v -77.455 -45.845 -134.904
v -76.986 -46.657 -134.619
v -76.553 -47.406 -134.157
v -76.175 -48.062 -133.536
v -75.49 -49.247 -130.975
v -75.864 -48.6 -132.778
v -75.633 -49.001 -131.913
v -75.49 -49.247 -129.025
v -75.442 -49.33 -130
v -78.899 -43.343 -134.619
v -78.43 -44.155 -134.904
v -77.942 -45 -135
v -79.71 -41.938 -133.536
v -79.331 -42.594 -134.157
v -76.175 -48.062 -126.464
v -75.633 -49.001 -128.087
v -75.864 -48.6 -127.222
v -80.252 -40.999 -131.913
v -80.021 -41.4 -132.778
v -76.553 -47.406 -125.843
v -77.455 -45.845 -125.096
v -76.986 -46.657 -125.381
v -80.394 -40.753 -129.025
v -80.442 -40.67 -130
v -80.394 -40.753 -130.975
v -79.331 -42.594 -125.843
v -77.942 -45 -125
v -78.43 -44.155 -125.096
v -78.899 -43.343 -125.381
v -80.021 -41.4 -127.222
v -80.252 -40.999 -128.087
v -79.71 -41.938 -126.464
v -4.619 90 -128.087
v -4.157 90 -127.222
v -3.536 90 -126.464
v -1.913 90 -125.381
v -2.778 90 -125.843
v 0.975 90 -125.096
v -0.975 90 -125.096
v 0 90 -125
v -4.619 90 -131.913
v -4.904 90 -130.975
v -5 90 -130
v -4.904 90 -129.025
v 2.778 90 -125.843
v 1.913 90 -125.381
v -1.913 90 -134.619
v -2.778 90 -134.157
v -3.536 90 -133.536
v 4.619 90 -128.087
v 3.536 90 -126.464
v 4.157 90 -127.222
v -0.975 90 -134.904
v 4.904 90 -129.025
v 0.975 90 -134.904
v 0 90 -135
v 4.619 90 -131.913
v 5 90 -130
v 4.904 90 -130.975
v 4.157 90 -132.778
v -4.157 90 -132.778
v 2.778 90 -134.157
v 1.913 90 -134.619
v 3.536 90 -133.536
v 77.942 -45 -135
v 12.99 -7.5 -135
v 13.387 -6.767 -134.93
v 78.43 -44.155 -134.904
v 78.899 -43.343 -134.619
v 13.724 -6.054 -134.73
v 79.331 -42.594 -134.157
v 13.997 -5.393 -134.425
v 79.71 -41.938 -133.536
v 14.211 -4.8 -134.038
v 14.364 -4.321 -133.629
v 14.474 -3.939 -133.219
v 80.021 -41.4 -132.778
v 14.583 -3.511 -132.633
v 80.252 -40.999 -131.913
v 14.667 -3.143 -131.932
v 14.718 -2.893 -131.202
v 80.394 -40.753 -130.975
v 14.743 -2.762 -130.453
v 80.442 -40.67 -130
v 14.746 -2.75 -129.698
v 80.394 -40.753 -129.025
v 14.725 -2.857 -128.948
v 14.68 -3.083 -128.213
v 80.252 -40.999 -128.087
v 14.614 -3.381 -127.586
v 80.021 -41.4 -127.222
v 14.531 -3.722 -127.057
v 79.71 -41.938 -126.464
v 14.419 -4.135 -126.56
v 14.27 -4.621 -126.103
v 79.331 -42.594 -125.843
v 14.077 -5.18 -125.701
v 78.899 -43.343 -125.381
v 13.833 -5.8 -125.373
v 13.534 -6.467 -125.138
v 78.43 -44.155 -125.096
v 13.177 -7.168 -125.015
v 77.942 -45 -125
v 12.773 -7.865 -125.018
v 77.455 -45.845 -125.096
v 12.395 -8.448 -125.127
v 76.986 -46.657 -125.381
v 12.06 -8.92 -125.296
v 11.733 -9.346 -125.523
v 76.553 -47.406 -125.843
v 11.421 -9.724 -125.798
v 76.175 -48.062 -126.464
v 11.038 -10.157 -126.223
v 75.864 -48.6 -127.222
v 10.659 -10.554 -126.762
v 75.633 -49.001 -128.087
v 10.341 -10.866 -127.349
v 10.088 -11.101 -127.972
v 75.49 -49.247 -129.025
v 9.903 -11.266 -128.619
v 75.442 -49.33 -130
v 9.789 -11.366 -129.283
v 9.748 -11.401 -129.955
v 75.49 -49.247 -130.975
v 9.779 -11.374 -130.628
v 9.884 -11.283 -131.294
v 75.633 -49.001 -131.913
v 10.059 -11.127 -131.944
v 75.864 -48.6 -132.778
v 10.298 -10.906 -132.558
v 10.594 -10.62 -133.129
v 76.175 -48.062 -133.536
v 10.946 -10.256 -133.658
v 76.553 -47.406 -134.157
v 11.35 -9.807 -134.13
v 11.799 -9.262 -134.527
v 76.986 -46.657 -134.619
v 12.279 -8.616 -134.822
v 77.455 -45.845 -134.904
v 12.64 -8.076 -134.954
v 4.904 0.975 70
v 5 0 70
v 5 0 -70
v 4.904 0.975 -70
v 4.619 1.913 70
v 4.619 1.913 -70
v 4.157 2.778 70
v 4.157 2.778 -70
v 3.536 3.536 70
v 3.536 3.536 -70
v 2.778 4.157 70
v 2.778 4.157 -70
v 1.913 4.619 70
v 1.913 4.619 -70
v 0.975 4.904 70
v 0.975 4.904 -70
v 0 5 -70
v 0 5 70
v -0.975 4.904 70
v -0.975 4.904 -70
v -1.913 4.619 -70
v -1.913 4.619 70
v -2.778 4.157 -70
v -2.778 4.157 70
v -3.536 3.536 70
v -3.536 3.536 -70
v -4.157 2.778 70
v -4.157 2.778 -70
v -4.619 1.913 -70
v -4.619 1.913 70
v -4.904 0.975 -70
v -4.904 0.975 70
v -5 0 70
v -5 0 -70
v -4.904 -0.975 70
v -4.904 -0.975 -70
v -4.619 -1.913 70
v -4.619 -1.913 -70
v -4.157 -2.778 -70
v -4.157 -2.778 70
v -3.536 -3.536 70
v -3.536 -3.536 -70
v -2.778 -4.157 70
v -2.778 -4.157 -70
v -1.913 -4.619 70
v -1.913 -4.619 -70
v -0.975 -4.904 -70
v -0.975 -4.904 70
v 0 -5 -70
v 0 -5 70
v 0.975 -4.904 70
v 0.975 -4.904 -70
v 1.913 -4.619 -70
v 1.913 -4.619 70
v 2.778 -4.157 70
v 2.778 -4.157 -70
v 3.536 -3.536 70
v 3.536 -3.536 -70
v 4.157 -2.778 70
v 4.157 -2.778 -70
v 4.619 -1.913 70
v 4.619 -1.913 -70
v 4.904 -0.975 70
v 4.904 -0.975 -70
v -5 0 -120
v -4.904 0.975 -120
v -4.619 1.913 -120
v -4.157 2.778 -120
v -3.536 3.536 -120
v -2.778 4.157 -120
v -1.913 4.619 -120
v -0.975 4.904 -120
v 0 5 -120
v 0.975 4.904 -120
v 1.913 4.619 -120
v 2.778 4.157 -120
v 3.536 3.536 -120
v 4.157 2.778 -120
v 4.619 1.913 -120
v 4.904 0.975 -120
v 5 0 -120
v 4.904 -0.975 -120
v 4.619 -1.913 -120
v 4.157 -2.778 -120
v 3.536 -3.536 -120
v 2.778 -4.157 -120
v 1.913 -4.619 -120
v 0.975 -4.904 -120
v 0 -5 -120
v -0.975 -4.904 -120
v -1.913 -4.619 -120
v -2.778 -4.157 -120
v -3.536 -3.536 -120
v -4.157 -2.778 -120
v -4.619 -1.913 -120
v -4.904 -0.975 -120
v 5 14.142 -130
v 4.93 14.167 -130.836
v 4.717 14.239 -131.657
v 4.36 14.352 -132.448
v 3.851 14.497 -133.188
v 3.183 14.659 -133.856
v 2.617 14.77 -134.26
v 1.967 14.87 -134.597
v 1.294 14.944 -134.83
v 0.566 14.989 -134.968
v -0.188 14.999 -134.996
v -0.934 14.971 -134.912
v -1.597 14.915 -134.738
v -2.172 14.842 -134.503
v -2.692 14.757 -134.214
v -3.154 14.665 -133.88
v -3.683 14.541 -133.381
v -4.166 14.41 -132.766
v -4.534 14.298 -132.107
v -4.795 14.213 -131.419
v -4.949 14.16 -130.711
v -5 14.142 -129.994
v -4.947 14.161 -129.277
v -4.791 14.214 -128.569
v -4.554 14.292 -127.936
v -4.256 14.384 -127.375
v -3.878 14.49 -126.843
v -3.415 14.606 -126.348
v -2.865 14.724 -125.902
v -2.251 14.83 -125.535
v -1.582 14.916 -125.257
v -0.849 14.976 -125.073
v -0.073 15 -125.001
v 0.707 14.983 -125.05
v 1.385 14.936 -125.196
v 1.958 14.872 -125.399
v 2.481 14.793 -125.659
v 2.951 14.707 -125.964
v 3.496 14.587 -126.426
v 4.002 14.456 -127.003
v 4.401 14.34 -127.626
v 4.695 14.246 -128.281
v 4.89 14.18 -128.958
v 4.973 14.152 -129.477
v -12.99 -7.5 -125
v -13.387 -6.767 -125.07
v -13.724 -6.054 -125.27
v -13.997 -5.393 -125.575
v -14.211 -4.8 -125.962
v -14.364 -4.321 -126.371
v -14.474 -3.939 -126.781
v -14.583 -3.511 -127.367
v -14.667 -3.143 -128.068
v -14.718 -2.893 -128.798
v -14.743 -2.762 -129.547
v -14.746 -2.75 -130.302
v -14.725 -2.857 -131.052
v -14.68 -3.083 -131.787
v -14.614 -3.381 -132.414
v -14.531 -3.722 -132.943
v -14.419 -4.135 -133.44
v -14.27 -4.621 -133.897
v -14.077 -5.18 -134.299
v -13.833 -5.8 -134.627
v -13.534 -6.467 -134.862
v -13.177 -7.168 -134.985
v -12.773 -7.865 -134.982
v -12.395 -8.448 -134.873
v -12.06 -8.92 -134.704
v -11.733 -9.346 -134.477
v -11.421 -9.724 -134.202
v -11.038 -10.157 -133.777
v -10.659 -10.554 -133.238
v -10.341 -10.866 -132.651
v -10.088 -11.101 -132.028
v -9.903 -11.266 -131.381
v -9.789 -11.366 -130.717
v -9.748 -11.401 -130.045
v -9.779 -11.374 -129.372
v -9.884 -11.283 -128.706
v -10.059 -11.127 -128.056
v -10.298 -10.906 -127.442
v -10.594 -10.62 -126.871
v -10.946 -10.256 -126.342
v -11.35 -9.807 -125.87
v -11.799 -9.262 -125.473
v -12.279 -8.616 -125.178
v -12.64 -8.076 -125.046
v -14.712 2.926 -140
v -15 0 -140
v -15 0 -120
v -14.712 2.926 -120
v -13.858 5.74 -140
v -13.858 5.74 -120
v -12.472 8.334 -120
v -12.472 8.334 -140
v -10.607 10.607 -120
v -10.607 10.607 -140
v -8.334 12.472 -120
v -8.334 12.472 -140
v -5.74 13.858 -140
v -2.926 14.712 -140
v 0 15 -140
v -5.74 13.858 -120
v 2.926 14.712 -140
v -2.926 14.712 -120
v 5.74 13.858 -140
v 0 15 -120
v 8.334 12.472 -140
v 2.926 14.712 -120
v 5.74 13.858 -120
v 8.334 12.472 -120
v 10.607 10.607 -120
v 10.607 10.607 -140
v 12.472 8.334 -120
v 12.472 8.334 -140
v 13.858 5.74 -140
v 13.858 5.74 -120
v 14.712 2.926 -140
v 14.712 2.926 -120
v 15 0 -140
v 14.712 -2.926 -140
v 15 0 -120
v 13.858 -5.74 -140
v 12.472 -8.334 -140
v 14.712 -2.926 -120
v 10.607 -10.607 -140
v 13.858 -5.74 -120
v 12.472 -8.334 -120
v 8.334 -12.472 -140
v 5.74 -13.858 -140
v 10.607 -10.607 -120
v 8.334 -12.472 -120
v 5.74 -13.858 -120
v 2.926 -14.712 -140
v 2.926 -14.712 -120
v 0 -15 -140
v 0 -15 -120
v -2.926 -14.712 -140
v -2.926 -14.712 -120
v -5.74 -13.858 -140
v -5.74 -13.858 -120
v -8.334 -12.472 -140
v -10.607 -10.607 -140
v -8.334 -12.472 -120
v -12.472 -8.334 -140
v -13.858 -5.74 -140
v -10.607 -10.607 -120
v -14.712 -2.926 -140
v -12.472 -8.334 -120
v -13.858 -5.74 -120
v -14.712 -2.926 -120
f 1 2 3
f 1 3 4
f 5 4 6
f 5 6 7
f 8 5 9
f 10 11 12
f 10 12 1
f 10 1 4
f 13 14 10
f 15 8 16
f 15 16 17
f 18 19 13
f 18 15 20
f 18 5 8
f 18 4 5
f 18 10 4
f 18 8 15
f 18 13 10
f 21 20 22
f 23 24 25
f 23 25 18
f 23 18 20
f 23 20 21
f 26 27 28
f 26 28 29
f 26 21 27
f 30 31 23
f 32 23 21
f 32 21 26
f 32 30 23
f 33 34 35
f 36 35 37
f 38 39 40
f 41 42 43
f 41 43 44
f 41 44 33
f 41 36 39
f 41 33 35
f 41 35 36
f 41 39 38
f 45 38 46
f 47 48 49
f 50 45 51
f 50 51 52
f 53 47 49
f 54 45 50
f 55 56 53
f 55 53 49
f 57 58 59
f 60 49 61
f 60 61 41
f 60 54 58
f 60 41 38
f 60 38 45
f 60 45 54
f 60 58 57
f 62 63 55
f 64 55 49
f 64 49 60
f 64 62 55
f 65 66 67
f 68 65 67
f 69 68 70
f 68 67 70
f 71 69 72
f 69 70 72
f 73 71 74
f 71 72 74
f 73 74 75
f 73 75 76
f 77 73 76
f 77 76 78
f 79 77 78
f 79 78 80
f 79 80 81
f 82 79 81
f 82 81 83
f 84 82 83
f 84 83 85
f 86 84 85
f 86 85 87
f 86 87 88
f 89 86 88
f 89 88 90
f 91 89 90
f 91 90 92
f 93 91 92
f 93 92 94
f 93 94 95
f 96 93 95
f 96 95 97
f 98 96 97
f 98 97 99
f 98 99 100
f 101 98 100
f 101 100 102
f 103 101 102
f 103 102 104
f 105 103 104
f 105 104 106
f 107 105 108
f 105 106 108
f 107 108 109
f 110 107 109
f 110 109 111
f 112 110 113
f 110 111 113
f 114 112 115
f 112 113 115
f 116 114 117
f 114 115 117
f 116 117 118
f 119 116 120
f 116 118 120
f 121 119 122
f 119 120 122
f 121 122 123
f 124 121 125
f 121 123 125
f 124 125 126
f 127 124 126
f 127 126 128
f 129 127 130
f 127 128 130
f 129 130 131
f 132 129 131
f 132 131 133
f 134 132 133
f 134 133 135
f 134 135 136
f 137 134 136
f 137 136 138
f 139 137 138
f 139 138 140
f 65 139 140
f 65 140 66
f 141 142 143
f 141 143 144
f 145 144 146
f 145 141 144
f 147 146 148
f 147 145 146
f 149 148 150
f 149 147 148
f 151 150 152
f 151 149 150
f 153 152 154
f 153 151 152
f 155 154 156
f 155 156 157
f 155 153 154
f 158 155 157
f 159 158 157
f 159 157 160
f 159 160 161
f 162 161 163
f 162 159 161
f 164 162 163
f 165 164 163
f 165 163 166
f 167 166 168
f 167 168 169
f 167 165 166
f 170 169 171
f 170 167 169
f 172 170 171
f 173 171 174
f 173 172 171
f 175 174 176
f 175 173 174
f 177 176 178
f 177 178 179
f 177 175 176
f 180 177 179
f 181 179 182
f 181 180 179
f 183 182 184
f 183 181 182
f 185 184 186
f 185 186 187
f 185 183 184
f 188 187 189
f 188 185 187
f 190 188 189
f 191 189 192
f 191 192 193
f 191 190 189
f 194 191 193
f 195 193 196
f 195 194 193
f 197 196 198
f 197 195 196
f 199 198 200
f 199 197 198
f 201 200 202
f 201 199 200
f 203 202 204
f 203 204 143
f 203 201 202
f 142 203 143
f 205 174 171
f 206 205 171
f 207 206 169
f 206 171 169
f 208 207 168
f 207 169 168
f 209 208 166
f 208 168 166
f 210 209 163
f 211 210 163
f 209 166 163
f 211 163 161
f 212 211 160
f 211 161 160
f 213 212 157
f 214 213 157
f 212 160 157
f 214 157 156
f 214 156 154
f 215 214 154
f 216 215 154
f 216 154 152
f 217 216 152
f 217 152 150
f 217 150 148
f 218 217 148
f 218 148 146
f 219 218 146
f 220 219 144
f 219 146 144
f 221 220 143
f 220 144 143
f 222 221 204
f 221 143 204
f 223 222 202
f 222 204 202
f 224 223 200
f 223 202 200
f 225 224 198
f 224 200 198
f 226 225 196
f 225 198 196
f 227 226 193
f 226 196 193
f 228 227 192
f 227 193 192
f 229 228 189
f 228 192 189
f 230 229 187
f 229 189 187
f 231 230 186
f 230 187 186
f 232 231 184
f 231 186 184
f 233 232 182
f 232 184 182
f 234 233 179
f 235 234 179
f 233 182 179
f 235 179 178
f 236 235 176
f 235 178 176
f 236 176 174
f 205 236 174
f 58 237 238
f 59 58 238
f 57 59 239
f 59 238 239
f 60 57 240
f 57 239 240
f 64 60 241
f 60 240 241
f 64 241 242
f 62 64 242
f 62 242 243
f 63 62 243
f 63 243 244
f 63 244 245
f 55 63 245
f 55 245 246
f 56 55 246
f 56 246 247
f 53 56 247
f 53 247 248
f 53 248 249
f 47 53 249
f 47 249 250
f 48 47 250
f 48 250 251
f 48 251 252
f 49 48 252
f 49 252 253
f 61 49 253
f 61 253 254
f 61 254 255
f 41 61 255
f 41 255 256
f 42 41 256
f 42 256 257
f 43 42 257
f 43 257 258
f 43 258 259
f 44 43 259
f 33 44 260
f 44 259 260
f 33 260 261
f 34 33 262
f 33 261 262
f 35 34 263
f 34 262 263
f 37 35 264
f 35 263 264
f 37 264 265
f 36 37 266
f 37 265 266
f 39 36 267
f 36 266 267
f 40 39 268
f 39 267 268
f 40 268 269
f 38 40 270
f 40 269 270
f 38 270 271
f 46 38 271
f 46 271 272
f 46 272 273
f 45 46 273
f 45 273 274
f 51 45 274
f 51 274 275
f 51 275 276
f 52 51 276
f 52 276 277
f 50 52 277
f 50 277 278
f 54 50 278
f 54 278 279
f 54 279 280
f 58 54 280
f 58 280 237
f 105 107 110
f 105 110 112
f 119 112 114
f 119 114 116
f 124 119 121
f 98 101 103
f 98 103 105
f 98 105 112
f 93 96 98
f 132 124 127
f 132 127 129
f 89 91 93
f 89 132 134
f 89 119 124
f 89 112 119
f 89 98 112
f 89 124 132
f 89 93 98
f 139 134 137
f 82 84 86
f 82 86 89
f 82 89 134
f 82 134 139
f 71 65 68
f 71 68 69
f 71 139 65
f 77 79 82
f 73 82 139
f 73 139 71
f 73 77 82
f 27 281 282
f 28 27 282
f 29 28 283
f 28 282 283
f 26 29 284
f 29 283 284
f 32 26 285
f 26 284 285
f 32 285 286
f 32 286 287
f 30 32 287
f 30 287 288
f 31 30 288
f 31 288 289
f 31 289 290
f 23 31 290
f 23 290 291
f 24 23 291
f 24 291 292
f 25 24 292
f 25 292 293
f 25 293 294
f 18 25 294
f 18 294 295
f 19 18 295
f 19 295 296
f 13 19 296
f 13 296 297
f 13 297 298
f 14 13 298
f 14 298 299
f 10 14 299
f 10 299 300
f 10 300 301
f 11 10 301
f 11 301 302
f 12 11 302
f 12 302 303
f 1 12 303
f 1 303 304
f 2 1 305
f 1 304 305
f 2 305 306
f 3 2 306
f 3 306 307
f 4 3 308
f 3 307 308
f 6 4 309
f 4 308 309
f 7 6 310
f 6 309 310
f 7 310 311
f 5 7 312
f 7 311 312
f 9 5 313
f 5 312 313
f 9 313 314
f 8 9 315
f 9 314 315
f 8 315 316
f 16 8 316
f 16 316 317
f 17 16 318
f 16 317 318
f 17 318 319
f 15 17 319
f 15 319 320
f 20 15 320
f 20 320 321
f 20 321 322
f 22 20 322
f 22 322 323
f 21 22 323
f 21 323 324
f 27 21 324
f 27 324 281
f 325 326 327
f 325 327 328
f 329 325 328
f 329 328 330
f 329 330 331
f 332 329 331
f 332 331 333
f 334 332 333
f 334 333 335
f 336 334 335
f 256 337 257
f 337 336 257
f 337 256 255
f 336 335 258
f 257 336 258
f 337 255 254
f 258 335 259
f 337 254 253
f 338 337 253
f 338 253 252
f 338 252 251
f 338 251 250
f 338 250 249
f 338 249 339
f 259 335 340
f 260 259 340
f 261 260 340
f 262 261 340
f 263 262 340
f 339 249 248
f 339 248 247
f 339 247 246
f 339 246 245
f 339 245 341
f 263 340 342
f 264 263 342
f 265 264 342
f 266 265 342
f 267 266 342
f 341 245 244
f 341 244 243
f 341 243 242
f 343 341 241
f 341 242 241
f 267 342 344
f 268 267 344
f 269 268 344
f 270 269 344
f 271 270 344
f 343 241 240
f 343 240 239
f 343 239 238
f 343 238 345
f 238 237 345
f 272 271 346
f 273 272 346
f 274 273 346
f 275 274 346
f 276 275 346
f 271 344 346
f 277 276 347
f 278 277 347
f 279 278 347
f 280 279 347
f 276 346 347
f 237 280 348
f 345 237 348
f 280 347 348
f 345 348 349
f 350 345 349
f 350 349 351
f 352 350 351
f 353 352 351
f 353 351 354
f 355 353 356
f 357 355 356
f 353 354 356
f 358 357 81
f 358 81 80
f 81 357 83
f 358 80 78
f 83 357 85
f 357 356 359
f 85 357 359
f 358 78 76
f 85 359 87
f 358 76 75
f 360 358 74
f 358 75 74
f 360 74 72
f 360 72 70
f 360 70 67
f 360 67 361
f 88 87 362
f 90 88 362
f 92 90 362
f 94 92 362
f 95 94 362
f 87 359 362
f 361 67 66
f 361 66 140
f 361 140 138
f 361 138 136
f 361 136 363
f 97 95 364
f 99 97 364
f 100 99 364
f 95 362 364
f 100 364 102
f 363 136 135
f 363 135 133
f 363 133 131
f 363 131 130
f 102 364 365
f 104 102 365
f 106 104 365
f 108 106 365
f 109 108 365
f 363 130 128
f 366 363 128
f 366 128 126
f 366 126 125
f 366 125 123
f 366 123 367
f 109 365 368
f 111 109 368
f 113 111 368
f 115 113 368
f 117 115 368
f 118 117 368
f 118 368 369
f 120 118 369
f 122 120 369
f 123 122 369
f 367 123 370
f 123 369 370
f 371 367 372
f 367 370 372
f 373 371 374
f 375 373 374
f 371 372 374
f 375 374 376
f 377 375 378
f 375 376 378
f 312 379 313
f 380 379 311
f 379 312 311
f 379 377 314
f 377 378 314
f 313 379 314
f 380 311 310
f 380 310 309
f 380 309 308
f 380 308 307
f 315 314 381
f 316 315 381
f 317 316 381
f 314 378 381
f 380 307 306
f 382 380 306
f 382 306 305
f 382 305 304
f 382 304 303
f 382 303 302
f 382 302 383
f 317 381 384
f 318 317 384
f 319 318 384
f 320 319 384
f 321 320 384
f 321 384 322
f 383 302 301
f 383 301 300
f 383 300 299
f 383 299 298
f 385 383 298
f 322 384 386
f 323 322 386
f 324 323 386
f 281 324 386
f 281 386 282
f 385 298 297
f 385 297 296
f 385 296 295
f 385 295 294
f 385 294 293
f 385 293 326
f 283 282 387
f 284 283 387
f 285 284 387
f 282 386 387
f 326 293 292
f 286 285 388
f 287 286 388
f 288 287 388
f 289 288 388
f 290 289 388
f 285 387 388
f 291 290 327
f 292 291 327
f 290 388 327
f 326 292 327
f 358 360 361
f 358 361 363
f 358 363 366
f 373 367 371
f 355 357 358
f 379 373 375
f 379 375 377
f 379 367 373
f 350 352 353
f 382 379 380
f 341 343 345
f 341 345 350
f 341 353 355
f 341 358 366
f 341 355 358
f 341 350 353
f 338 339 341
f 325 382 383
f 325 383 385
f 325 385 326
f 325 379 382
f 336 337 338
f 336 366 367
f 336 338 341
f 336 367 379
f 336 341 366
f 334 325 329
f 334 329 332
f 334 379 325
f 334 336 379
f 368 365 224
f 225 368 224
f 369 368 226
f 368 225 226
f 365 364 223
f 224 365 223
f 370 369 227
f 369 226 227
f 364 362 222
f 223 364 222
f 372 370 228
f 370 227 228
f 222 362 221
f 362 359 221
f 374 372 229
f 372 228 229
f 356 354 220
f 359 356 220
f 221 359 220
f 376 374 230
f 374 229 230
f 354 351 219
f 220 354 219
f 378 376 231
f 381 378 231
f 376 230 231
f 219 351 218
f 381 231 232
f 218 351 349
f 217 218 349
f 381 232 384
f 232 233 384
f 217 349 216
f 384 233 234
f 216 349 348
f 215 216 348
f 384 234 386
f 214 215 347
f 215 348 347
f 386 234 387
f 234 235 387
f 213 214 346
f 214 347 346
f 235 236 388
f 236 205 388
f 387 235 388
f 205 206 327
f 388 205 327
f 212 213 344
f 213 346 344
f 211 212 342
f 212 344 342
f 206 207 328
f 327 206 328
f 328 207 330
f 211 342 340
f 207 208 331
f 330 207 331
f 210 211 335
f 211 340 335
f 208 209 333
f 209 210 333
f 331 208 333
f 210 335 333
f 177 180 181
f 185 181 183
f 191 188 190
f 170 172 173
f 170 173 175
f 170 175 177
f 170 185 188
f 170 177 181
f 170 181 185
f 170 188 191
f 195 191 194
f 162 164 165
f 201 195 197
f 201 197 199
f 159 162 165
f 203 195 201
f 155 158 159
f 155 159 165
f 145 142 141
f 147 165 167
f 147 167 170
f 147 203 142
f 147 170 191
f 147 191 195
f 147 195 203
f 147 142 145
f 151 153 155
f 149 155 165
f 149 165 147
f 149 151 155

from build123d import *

# Parameters (mm, degrees)
SKETCH_1_R      = 5
EXTRUDE_1_DEPTH = 70
SKETCH_2_R      = 5
EXTRUDE_2_DEPTH = 50
SKETCH_3_R      = 15
EXTRUDE_3_DEPTH = 20
SKETCH_4_R      = 5
EXTRUDE_4_DEPTH = 90
SKETCH_8_R      = 5
EXTRUDE_5_DEPTH = 90
SKETCH_9_R      = 5
EXTRUDE_6_DEPTH = 90


with BuildPart() as part:
    # 草图1 → 凸台-拉伸1 (new, symmetric)
    with BuildSketch(Plane.XY):
        Circle(SKETCH_1_R)
    extrude(amount=EXTRUDE_1_DEPTH, both=True)

    # 草图2 → 凸台-拉伸2 (add)
    with BuildSketch(Plane(origin=(0, 0, -70), x_dir=(-1, 0, 0), z_dir=(0, 0, -1))):
        Circle(SKETCH_2_R)
    extrude(amount=EXTRUDE_2_DEPTH)

    # 草图3 → 凸台-拉伸3 (add)
    with BuildSketch(Plane(origin=(0, 0, -120), x_dir=(-1, 0, 0), z_dir=(0, 0, -1))):
        Circle(SKETCH_3_R)
    extrude(amount=EXTRUDE_3_DEPTH)

    # 草图4 → 凸台-拉伸4 (add)
    with BuildSketch(Plane(origin=(0, 0, 0), x_dir=(1, 0, 0), z_dir=(0, 1, 0))):
        with Locations((0, 130)):
            Circle(SKETCH_4_R)
    extrude(amount=EXTRUDE_4_DEPTH)

    # 草图8 → 凸台-拉伸5 (add)
    with BuildSketch(Plane(origin=(0, 0, 0), x_dir=(0, 0, -1), z_dir=(0.8660254037844363, -0.5000000000000042, 0))):
        with Locations((130, 0)):
            Circle(SKETCH_8_R)
    extrude(amount=EXTRUDE_5_DEPTH)

    # 草图9 → 凸台-拉伸6 (add)
    with BuildSketch(Plane(origin=(0, 0, 0), x_dir=(0, 0, 1), z_dir=(-0.8660254037844365, -0.500000000000004, 0))):
        with Locations((-130, 0)):
            Circle(SKETCH_9_R)
    extrude(amount=EXTRUDE_6_DEPTH)


solid = part.part
